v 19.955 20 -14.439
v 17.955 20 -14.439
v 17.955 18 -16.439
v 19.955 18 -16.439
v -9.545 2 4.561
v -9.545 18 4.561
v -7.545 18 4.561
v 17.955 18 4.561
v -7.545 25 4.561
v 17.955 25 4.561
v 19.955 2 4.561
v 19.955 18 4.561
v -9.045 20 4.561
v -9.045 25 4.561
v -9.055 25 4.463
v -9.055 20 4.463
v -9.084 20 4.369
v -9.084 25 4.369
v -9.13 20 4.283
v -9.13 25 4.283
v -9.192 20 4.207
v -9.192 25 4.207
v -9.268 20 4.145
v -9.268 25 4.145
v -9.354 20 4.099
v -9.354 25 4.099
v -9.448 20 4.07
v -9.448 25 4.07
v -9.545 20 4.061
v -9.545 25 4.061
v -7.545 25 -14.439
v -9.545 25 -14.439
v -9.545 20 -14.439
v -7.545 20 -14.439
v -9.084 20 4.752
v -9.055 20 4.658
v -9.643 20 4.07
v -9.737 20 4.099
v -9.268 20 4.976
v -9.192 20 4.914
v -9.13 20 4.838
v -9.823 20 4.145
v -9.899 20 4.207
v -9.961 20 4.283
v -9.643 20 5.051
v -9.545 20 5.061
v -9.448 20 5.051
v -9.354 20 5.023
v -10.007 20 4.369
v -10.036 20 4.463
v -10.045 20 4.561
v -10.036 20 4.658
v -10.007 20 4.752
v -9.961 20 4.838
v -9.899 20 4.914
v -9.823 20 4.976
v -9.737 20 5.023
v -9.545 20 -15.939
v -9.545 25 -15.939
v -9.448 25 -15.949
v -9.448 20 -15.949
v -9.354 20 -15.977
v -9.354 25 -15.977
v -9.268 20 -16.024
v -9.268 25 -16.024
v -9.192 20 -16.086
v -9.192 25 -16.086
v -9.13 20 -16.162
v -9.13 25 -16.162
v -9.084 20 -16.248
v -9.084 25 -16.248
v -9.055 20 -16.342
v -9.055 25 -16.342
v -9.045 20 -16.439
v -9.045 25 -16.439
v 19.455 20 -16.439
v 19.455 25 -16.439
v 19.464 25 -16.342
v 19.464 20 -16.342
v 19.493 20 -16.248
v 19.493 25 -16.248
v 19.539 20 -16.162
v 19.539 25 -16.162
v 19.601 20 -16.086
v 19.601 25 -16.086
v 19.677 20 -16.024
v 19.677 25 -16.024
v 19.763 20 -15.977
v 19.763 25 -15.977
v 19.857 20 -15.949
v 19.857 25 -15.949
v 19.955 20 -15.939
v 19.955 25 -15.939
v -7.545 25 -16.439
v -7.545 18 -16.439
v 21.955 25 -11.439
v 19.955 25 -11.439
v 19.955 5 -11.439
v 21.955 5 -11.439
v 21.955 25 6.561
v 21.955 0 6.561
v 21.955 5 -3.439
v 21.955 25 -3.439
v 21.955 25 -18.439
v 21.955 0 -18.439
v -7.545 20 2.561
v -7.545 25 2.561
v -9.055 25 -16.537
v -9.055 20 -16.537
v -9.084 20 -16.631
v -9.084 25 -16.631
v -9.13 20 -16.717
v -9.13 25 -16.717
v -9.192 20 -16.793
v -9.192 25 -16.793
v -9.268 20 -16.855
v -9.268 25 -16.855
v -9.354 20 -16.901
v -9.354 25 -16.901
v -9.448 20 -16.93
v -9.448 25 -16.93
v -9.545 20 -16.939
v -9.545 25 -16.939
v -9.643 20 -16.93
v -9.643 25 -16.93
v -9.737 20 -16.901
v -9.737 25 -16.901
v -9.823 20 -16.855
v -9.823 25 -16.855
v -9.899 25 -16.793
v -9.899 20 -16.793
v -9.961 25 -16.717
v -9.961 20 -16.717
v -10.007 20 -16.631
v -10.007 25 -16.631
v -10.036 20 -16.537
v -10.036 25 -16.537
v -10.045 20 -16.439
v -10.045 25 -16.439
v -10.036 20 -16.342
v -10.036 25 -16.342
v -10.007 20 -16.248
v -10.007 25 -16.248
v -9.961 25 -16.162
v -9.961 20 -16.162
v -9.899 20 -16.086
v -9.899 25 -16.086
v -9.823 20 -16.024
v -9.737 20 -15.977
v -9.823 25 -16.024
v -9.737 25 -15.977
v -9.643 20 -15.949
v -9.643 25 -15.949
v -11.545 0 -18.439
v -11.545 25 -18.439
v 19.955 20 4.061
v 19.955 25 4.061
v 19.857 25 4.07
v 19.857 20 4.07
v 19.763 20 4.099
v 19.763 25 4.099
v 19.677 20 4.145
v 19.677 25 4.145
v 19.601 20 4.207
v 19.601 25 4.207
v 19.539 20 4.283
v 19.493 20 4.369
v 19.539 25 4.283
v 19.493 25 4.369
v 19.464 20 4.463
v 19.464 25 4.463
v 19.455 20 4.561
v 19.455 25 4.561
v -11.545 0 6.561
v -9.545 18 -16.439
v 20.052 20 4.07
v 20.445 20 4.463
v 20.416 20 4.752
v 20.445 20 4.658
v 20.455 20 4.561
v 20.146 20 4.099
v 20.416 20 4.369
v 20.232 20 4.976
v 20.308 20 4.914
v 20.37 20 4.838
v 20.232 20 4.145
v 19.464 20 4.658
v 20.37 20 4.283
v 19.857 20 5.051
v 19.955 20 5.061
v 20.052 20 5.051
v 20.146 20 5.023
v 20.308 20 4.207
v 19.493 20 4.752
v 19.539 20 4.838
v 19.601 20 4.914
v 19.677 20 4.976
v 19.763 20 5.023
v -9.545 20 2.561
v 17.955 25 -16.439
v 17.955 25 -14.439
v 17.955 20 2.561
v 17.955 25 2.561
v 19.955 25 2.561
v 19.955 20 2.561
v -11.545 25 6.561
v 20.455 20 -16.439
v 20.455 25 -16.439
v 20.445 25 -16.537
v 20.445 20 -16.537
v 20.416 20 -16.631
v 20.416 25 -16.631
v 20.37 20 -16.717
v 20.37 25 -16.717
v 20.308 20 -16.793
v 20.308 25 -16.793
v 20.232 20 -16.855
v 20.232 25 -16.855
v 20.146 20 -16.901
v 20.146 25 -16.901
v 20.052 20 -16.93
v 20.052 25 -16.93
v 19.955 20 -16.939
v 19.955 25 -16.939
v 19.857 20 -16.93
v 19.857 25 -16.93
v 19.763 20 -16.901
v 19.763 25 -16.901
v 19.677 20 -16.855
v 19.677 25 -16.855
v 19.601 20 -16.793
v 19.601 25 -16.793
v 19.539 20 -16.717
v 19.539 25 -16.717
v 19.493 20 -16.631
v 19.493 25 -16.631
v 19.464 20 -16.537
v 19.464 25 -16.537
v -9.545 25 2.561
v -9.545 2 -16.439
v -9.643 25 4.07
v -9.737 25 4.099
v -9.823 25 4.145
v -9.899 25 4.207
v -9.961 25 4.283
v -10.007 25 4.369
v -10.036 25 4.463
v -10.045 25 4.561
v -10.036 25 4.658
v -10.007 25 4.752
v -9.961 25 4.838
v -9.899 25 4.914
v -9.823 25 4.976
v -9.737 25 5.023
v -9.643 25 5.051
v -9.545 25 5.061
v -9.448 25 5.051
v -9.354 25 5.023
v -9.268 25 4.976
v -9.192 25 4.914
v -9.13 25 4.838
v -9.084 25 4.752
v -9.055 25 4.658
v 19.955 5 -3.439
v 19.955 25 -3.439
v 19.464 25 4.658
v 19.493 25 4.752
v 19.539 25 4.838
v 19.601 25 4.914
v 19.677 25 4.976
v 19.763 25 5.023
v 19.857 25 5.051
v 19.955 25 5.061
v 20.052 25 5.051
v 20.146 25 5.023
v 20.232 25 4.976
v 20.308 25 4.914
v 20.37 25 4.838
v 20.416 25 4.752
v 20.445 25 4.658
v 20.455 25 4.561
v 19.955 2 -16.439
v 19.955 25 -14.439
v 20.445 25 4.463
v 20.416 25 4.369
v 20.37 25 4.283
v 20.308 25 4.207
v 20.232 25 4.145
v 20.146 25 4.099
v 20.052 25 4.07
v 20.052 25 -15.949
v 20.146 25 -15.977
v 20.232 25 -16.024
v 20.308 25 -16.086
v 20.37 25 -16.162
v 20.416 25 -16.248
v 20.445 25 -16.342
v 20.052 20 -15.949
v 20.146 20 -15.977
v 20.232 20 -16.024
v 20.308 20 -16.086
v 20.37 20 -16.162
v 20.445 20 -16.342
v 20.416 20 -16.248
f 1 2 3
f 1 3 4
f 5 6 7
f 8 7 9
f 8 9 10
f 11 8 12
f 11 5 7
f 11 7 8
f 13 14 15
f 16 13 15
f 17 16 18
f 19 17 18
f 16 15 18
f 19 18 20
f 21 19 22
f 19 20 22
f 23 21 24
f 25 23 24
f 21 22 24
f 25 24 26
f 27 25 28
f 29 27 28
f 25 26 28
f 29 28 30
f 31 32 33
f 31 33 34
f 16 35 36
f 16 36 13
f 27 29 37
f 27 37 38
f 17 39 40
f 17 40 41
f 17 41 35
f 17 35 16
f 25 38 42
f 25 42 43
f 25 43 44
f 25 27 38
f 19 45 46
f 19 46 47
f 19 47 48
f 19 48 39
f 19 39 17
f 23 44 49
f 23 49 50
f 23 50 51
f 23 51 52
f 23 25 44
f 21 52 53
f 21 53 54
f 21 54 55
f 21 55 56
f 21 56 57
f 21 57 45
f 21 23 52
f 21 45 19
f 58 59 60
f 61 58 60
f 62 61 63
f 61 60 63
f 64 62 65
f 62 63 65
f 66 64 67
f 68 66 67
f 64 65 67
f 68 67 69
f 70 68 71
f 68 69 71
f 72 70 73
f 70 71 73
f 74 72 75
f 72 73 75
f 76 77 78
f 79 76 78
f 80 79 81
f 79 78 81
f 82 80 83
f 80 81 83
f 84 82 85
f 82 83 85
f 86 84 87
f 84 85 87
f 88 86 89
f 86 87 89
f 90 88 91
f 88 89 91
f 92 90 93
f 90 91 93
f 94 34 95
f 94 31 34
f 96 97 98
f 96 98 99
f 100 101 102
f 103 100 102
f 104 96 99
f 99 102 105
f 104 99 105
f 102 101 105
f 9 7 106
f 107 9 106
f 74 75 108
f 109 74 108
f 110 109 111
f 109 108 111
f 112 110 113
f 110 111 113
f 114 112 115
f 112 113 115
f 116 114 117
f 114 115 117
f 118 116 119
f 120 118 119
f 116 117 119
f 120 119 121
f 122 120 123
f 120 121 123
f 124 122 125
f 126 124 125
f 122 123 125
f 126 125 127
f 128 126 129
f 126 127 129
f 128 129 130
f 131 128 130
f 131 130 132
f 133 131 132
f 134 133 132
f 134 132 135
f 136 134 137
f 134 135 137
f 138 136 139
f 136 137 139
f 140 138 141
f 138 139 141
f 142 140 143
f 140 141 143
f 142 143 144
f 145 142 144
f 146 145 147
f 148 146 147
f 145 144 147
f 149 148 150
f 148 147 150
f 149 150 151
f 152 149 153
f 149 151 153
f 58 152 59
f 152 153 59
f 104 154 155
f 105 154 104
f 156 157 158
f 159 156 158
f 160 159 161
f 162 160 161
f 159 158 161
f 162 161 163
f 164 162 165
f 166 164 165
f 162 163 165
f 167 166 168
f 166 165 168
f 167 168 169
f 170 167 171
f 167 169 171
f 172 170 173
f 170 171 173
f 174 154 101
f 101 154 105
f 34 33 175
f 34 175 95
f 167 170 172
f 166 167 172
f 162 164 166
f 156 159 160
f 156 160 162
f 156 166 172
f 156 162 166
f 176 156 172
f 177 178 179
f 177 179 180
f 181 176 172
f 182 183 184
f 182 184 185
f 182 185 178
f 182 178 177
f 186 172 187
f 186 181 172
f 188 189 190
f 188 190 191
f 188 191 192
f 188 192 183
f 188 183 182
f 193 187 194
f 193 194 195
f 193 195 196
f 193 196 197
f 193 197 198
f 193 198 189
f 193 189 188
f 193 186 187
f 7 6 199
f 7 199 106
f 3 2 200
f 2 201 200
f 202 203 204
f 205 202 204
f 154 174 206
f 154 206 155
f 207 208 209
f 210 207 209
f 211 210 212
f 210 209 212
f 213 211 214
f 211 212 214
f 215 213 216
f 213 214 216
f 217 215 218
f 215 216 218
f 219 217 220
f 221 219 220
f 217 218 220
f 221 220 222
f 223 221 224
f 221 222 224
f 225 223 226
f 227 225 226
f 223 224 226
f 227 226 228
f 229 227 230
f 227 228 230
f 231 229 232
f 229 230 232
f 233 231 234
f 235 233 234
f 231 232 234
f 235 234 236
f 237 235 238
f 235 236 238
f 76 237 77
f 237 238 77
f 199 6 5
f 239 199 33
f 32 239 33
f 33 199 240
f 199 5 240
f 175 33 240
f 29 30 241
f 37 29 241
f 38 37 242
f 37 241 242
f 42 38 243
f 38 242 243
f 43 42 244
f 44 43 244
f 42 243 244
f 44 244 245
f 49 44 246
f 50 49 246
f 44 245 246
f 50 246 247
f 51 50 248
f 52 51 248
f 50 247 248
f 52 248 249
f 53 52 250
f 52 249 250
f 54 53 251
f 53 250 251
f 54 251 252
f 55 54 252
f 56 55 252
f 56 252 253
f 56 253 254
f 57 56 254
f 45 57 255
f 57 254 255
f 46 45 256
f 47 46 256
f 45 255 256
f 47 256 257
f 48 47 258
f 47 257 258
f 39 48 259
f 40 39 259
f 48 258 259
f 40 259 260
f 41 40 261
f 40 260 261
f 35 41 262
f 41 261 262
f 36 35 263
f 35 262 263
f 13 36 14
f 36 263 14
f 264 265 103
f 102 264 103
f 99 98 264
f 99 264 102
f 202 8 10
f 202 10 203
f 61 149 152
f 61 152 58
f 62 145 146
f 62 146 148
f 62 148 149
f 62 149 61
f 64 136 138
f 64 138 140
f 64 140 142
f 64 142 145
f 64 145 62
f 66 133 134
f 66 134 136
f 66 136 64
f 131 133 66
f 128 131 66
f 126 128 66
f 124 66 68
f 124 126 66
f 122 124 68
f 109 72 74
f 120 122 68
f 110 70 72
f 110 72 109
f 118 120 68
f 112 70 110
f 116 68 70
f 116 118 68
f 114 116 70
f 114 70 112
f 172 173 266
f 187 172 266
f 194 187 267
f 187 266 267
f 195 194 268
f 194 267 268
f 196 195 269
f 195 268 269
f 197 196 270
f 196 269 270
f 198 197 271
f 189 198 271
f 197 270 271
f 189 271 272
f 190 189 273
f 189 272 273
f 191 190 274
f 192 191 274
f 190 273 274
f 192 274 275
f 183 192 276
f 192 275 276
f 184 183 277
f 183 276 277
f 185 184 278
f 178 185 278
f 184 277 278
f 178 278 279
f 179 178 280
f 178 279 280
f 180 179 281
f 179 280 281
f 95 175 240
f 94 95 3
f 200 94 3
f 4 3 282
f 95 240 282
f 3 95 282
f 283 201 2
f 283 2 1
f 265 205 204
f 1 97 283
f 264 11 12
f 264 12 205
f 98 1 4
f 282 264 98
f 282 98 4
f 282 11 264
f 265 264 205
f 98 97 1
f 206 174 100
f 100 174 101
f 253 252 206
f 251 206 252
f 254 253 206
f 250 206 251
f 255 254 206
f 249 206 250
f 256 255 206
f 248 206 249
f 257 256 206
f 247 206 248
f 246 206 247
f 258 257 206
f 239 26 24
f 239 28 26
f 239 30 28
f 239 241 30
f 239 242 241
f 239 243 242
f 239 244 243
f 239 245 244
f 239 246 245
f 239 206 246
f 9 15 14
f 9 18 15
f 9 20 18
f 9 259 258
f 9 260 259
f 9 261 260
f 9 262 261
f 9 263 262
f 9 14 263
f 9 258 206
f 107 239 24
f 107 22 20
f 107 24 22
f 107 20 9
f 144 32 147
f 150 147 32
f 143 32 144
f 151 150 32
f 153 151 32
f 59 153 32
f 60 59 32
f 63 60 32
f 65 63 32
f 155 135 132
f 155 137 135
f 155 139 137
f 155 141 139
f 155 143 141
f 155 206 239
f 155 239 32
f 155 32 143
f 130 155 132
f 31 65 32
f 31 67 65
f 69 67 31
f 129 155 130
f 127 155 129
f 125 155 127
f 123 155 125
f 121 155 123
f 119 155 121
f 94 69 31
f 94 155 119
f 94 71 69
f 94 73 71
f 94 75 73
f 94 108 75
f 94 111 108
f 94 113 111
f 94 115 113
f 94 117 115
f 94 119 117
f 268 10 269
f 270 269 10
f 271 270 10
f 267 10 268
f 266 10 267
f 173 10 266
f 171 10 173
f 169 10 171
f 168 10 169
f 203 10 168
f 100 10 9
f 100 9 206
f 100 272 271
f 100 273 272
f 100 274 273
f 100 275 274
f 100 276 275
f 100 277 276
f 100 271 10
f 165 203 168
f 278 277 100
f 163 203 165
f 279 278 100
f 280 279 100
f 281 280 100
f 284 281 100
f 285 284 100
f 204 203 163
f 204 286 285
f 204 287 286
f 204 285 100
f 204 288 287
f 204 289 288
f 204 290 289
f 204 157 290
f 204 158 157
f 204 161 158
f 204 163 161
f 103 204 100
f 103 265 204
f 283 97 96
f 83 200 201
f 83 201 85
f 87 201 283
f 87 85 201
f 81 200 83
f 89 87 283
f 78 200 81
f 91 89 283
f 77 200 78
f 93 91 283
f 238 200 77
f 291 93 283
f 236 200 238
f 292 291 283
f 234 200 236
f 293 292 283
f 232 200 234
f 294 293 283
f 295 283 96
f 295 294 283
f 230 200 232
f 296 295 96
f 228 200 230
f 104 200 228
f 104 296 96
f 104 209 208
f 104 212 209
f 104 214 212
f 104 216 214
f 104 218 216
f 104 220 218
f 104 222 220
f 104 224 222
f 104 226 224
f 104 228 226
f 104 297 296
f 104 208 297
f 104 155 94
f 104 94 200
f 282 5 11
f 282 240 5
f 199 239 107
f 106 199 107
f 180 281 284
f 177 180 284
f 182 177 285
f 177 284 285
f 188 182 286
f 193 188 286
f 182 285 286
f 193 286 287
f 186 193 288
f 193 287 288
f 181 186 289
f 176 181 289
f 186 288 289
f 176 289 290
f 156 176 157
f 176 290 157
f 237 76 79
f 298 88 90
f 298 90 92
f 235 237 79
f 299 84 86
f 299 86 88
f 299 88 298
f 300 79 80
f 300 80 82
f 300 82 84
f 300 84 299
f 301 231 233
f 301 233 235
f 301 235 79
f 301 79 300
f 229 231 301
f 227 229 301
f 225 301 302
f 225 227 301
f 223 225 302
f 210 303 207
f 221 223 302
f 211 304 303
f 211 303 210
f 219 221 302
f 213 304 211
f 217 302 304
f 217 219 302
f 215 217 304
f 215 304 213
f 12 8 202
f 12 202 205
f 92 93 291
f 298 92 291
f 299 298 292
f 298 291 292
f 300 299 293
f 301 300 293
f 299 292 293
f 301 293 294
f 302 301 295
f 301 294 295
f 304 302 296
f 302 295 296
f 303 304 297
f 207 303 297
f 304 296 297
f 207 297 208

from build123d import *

# Parameters (mm, degrees)
SKETCH1_W           = 33.5
SKETCH1_H           = 25
SKETCH1_W_2         = 29.5
SKETCH1_H_2         = 21
BOSS_EXTRUDE1_DEPTH = 2
SKETCH1_3_W         = 33.5
SKETCH1_3_H         = 25
SKETCH1_3_W_2       = 29.5
SKETCH1_3_H_2       = 21
BOSS_EXTRUDE2_DEPTH = 25
SKETCH2_W           = 2
SKETCH2_H           = 8
CUT_EXTRUDE1_DEPTH  = 20
SKETCH3_W           = 2
SKETCH3_H           = 2
BOSS_EXTRUDE3_DEPTH = 5
CHAMFER1_SIZE       = 2
CUT_EXTRUDE2_DEPTH  = 5


with BuildPart() as part:
    # Sketch1 → Boss-Extrude1 (new body)
    # profile 1 of 2: a face of its own
    with BuildSketch(Plane(origin=(0, 0, 0), x_dir=(1, 0, 0), z_dir=(0, 1, 0))):
        with Locations((5.204545455, 5.939393939)):
            Rectangle(SKETCH1_W, SKETCH1_H)
        with Locations((5.204545455, 5.939393939)):
            Rectangle(SKETCH1_W_2, SKETCH1_H_2, mode=Mode.SUBTRACT)
    # profile 2 of 2: a face of its own
    with BuildSketch(Plane(origin=(0, 0, 0), x_dir=(1, 0, 0), z_dir=(0, 1, 0))):
        with Locations((5.204545455, 5.939393939)):
            Rectangle(SKETCH1_W_2, SKETCH1_H_2)
    extrude(amount=BOSS_EXTRUDE1_DEPTH)

    # Sketch1<3> → Boss-Extrude2 (add)
    with BuildSketch(Plane(origin=(0, 0, 0), x_dir=(1, 0, 0), z_dir=(0, 1, 0))):
        with Locations((5.204545455, 5.939393939)):
            Rectangle(SKETCH1_3_W, SKETCH1_3_H)
        with Locations((5.204545455, 5.939393939)):
            Rectangle(SKETCH1_3_W_2, SKETCH1_3_H_2, mode=Mode.SUBTRACT)
    extrude(amount=BOSS_EXTRUDE2_DEPTH)

    # Sketch2 → Cut-Extrude1 (cut)
    with BuildSketch(Plane(origin=(0, 25, 0), x_dir=(1, 0, 0), z_dir=(0, 1, 0))):
        with Locations((20.954545455, 7.439393939)):
            Rectangle(SKETCH2_W, SKETCH2_H)
    extrude(amount=-CUT_EXTRUDE1_DEPTH, mode=Mode.SUBTRACT)

    # Sketch3 → Boss-Extrude3 (add)
    with BuildSketch(Plane(origin=(0, 25, 0), x_dir=(1, 0, 0), z_dir=(0, 1, 0))):
        with Locations((-8.545454545, 15.439393939)):
            Rectangle(SKETCH3_W, SKETCH3_H)
        with Locations((-8.545454545, -3.560606061)):
            Rectangle(SKETCH3_W, SKETCH3_H)
        with Locations((18.954545455, -3.560606061)):
            Rectangle(SKETCH3_W, SKETCH3_H)
        with Locations((18.954545455, 15.439393939)):
            Rectangle(SKETCH3_W, SKETCH3_H)
    extrude(amount=-BOSS_EXTRUDE3_DEPTH)

    # Chamfer1
    chamfer1_edges = [part.edges().sort_by_distance(p)[0] for p in [
        (18.954545455, 20, 4.560606061),
        (-8.545454545, 20, 4.560606061),
        (18.954545455, 20, -16.439393939),
        (-8.545454545, 20, -16.439393939),
    ]]
    chamfer(chamfer1_edges, length=CHAMFER1_SIZE - 0.0001)  # a hair under: the kernel refuses the full size

    # Sketch4 → Cut-Extrude2 (cut)
    with BuildSketch(Plane(origin=(0, 25, 0), x_dir=(1, 0, 0), z_dir=(0, 1, 0))):
        with BuildLine():
            ThreePointArc((20.454545455, -4.560606061), (20.308098845, -4.20705267), (19.954545455, -4.060606061))
            Line((19.954545455, -4.060606061), (19.954545455, -4.560606061))
            Line((19.954545455, -4.560606061), (19.454545455, -4.560606061))
            ThreePointArc((19.454545455, -4.560606061), (19.954545455, -5.060606061), (20.454545455, -4.560606061))
        make_face()
        with BuildLine():
            Line((19.954545455, -4.560606061), (19.954545455, -4.060606061))
            ThreePointArc((19.954545455, -4.060606061), (19.600992064, -4.20705267), (19.454545455, -4.560606061))
            Line((19.454545455, -4.560606061), (19.954545455, -4.560606061))
        make_face()
        with BuildLine():
            ThreePointArc((20.454545455, -4.560606061), (20.308098845, -4.20705267), (19.954545455, -4.060606061))
            Line((19.954545455, -4.060606061), (19.954545455, -4.560606061))
            Line((19.954545455, -4.560606061), (19.454545455, -4.560606061))
            ThreePointArc((19.454545455, -4.560606061), (19.954545455, -5.060606061), (20.454545455, -4.560606061))
        make_face()
        with BuildLine():
            Line((19.954545455, -4.560606061), (19.954545455, -4.060606061))
            ThreePointArc((19.954545455, -4.060606061), (19.600992064, -4.20705267), (19.454545455, -4.560606061))
            Line((19.454545455, -4.560606061), (19.954545455, -4.560606061))
        make_face()
        with BuildLine():
            ThreePointArc((20.454545455, 16.439393939), (19.954545455, 16.939393939), (19.454545455, 16.439393939))
            Line((19.454545455, 16.439393939), (19.954545455, 16.439393939))
            Line((19.954545455, 16.439393939), (19.954545455, 15.939393939))
            ThreePointArc((19.954545455, 15.939393939), (20.308098845, 16.085840549), (20.454545455, 16.439393939))
        make_face()
        with BuildLine():
            Line((19.954545455, 16.439393939), (19.454545455, 16.439393939))
            ThreePointArc((19.454545455, 16.439393939), (19.600992064, 16.085840549), (19.954545455, 15.939393939))
            Line((19.954545455, 15.939393939), (19.954545455, 16.439393939))
        make_face()
        with BuildLine():
            ThreePointArc((20.454545455, 16.439393939), (19.954545455, 16.939393939), (19.454545455, 16.439393939))
            Line((19.454545455, 16.439393939), (19.954545455, 16.439393939))
            Line((19.954545455, 16.439393939), (19.954545455, 15.939393939))
            ThreePointArc((19.954545455, 15.939393939), (20.308098845, 16.085840549), (20.454545455, 16.439393939))
        make_face()
        with BuildLine():
            Line((19.954545455, 16.439393939), (19.454545455, 16.439393939))
            ThreePointArc((19.454545455, 16.439393939), (19.600992064, 16.085840549), (19.954545455, 15.939393939))
            Line((19.954545455, 15.939393939), (19.954545455, 16.439393939))
        make_face()
        with BuildLine():
            ThreePointArc((-9.545454545, 15.939393939), (-9.191901155, 16.085840549), (-9.045454545, 16.439393939))
            Line((-9.045454545, 16.439393939), (-9.545454545, 16.439393939))
            Line((-9.545454545, 16.439393939), (-9.545454545, 15.939393939))
        make_face()
        with BuildLine():
            Line((-9.545454545, 16.439393939), (-9.045454545, 16.439393939))
            ThreePointArc((-9.045454545, 16.439393939), (-9.899007936, 16.79294733), (-9.545454545, 15.939393939))
            Line((-9.545454545, 15.939393939), (-9.545454545, 16.439393939))
        make_face()
        with BuildLine():
            ThreePointArc((-9.545454545, 15.939393939), (-9.191901155, 16.085840549), (-9.045454545, 16.439393939))
            Line((-9.045454545, 16.439393939), (-9.545454545, 16.439393939))
            Line((-9.545454545, 16.439393939), (-9.545454545, 15.939393939))
        make_face()
        with BuildLine():
            Line((-9.545454545, 16.439393939), (-9.045454545, 16.439393939))
            ThreePointArc((-9.045454545, 16.439393939), (-9.899007936, 16.79294733), (-9.545454545, 15.939393939))
            Line((-9.545454545, 15.939393939), (-9.545454545, 16.439393939))
        make_face()
        with BuildLine():
            ThreePointArc((-9.045454545, -4.560606061), (-9.191901155, -4.20705267), (-9.545454545, -4.060606061))
            Line((-9.545454545, -4.060606061), (-9.545454545, -4.560606061))
            Line((-9.545454545, -4.560606061), (-9.045454545, -4.560606061))
        make_face()
        with BuildLine():
            Line((-9.545454545, -4.560606061), (-9.545454545, -4.060606061))
            ThreePointArc((-9.545454545, -4.060606061), (-9.899007936, -4.914159451), (-9.045454545, -4.560606061))
            Line((-9.045454545, -4.560606061), (-9.545454545, -4.560606061))
        make_face()
        with BuildLine():
            ThreePointArc((-9.045454545, -4.560606061), (-9.191901155, -4.20705267), (-9.545454545, -4.060606061))
            Line((-9.545454545, -4.060606061), (-9.545454545, -4.560606061))
            Line((-9.545454545, -4.560606061), (-9.045454545, -4.560606061))
        make_face()
        with BuildLine():
            Line((-9.545454545, -4.560606061), (-9.545454545, -4.060606061))
            ThreePointArc((-9.545454545, -4.060606061), (-9.899007936, -4.914159451), (-9.045454545, -4.560606061))
            Line((-9.045454545, -4.560606061), (-9.545454545, -4.560606061))
        make_face()
    extrude(amount=-CUT_EXTRUDE2_DEPTH, mode=Mode.SUBTRACT)


solid = part.part
